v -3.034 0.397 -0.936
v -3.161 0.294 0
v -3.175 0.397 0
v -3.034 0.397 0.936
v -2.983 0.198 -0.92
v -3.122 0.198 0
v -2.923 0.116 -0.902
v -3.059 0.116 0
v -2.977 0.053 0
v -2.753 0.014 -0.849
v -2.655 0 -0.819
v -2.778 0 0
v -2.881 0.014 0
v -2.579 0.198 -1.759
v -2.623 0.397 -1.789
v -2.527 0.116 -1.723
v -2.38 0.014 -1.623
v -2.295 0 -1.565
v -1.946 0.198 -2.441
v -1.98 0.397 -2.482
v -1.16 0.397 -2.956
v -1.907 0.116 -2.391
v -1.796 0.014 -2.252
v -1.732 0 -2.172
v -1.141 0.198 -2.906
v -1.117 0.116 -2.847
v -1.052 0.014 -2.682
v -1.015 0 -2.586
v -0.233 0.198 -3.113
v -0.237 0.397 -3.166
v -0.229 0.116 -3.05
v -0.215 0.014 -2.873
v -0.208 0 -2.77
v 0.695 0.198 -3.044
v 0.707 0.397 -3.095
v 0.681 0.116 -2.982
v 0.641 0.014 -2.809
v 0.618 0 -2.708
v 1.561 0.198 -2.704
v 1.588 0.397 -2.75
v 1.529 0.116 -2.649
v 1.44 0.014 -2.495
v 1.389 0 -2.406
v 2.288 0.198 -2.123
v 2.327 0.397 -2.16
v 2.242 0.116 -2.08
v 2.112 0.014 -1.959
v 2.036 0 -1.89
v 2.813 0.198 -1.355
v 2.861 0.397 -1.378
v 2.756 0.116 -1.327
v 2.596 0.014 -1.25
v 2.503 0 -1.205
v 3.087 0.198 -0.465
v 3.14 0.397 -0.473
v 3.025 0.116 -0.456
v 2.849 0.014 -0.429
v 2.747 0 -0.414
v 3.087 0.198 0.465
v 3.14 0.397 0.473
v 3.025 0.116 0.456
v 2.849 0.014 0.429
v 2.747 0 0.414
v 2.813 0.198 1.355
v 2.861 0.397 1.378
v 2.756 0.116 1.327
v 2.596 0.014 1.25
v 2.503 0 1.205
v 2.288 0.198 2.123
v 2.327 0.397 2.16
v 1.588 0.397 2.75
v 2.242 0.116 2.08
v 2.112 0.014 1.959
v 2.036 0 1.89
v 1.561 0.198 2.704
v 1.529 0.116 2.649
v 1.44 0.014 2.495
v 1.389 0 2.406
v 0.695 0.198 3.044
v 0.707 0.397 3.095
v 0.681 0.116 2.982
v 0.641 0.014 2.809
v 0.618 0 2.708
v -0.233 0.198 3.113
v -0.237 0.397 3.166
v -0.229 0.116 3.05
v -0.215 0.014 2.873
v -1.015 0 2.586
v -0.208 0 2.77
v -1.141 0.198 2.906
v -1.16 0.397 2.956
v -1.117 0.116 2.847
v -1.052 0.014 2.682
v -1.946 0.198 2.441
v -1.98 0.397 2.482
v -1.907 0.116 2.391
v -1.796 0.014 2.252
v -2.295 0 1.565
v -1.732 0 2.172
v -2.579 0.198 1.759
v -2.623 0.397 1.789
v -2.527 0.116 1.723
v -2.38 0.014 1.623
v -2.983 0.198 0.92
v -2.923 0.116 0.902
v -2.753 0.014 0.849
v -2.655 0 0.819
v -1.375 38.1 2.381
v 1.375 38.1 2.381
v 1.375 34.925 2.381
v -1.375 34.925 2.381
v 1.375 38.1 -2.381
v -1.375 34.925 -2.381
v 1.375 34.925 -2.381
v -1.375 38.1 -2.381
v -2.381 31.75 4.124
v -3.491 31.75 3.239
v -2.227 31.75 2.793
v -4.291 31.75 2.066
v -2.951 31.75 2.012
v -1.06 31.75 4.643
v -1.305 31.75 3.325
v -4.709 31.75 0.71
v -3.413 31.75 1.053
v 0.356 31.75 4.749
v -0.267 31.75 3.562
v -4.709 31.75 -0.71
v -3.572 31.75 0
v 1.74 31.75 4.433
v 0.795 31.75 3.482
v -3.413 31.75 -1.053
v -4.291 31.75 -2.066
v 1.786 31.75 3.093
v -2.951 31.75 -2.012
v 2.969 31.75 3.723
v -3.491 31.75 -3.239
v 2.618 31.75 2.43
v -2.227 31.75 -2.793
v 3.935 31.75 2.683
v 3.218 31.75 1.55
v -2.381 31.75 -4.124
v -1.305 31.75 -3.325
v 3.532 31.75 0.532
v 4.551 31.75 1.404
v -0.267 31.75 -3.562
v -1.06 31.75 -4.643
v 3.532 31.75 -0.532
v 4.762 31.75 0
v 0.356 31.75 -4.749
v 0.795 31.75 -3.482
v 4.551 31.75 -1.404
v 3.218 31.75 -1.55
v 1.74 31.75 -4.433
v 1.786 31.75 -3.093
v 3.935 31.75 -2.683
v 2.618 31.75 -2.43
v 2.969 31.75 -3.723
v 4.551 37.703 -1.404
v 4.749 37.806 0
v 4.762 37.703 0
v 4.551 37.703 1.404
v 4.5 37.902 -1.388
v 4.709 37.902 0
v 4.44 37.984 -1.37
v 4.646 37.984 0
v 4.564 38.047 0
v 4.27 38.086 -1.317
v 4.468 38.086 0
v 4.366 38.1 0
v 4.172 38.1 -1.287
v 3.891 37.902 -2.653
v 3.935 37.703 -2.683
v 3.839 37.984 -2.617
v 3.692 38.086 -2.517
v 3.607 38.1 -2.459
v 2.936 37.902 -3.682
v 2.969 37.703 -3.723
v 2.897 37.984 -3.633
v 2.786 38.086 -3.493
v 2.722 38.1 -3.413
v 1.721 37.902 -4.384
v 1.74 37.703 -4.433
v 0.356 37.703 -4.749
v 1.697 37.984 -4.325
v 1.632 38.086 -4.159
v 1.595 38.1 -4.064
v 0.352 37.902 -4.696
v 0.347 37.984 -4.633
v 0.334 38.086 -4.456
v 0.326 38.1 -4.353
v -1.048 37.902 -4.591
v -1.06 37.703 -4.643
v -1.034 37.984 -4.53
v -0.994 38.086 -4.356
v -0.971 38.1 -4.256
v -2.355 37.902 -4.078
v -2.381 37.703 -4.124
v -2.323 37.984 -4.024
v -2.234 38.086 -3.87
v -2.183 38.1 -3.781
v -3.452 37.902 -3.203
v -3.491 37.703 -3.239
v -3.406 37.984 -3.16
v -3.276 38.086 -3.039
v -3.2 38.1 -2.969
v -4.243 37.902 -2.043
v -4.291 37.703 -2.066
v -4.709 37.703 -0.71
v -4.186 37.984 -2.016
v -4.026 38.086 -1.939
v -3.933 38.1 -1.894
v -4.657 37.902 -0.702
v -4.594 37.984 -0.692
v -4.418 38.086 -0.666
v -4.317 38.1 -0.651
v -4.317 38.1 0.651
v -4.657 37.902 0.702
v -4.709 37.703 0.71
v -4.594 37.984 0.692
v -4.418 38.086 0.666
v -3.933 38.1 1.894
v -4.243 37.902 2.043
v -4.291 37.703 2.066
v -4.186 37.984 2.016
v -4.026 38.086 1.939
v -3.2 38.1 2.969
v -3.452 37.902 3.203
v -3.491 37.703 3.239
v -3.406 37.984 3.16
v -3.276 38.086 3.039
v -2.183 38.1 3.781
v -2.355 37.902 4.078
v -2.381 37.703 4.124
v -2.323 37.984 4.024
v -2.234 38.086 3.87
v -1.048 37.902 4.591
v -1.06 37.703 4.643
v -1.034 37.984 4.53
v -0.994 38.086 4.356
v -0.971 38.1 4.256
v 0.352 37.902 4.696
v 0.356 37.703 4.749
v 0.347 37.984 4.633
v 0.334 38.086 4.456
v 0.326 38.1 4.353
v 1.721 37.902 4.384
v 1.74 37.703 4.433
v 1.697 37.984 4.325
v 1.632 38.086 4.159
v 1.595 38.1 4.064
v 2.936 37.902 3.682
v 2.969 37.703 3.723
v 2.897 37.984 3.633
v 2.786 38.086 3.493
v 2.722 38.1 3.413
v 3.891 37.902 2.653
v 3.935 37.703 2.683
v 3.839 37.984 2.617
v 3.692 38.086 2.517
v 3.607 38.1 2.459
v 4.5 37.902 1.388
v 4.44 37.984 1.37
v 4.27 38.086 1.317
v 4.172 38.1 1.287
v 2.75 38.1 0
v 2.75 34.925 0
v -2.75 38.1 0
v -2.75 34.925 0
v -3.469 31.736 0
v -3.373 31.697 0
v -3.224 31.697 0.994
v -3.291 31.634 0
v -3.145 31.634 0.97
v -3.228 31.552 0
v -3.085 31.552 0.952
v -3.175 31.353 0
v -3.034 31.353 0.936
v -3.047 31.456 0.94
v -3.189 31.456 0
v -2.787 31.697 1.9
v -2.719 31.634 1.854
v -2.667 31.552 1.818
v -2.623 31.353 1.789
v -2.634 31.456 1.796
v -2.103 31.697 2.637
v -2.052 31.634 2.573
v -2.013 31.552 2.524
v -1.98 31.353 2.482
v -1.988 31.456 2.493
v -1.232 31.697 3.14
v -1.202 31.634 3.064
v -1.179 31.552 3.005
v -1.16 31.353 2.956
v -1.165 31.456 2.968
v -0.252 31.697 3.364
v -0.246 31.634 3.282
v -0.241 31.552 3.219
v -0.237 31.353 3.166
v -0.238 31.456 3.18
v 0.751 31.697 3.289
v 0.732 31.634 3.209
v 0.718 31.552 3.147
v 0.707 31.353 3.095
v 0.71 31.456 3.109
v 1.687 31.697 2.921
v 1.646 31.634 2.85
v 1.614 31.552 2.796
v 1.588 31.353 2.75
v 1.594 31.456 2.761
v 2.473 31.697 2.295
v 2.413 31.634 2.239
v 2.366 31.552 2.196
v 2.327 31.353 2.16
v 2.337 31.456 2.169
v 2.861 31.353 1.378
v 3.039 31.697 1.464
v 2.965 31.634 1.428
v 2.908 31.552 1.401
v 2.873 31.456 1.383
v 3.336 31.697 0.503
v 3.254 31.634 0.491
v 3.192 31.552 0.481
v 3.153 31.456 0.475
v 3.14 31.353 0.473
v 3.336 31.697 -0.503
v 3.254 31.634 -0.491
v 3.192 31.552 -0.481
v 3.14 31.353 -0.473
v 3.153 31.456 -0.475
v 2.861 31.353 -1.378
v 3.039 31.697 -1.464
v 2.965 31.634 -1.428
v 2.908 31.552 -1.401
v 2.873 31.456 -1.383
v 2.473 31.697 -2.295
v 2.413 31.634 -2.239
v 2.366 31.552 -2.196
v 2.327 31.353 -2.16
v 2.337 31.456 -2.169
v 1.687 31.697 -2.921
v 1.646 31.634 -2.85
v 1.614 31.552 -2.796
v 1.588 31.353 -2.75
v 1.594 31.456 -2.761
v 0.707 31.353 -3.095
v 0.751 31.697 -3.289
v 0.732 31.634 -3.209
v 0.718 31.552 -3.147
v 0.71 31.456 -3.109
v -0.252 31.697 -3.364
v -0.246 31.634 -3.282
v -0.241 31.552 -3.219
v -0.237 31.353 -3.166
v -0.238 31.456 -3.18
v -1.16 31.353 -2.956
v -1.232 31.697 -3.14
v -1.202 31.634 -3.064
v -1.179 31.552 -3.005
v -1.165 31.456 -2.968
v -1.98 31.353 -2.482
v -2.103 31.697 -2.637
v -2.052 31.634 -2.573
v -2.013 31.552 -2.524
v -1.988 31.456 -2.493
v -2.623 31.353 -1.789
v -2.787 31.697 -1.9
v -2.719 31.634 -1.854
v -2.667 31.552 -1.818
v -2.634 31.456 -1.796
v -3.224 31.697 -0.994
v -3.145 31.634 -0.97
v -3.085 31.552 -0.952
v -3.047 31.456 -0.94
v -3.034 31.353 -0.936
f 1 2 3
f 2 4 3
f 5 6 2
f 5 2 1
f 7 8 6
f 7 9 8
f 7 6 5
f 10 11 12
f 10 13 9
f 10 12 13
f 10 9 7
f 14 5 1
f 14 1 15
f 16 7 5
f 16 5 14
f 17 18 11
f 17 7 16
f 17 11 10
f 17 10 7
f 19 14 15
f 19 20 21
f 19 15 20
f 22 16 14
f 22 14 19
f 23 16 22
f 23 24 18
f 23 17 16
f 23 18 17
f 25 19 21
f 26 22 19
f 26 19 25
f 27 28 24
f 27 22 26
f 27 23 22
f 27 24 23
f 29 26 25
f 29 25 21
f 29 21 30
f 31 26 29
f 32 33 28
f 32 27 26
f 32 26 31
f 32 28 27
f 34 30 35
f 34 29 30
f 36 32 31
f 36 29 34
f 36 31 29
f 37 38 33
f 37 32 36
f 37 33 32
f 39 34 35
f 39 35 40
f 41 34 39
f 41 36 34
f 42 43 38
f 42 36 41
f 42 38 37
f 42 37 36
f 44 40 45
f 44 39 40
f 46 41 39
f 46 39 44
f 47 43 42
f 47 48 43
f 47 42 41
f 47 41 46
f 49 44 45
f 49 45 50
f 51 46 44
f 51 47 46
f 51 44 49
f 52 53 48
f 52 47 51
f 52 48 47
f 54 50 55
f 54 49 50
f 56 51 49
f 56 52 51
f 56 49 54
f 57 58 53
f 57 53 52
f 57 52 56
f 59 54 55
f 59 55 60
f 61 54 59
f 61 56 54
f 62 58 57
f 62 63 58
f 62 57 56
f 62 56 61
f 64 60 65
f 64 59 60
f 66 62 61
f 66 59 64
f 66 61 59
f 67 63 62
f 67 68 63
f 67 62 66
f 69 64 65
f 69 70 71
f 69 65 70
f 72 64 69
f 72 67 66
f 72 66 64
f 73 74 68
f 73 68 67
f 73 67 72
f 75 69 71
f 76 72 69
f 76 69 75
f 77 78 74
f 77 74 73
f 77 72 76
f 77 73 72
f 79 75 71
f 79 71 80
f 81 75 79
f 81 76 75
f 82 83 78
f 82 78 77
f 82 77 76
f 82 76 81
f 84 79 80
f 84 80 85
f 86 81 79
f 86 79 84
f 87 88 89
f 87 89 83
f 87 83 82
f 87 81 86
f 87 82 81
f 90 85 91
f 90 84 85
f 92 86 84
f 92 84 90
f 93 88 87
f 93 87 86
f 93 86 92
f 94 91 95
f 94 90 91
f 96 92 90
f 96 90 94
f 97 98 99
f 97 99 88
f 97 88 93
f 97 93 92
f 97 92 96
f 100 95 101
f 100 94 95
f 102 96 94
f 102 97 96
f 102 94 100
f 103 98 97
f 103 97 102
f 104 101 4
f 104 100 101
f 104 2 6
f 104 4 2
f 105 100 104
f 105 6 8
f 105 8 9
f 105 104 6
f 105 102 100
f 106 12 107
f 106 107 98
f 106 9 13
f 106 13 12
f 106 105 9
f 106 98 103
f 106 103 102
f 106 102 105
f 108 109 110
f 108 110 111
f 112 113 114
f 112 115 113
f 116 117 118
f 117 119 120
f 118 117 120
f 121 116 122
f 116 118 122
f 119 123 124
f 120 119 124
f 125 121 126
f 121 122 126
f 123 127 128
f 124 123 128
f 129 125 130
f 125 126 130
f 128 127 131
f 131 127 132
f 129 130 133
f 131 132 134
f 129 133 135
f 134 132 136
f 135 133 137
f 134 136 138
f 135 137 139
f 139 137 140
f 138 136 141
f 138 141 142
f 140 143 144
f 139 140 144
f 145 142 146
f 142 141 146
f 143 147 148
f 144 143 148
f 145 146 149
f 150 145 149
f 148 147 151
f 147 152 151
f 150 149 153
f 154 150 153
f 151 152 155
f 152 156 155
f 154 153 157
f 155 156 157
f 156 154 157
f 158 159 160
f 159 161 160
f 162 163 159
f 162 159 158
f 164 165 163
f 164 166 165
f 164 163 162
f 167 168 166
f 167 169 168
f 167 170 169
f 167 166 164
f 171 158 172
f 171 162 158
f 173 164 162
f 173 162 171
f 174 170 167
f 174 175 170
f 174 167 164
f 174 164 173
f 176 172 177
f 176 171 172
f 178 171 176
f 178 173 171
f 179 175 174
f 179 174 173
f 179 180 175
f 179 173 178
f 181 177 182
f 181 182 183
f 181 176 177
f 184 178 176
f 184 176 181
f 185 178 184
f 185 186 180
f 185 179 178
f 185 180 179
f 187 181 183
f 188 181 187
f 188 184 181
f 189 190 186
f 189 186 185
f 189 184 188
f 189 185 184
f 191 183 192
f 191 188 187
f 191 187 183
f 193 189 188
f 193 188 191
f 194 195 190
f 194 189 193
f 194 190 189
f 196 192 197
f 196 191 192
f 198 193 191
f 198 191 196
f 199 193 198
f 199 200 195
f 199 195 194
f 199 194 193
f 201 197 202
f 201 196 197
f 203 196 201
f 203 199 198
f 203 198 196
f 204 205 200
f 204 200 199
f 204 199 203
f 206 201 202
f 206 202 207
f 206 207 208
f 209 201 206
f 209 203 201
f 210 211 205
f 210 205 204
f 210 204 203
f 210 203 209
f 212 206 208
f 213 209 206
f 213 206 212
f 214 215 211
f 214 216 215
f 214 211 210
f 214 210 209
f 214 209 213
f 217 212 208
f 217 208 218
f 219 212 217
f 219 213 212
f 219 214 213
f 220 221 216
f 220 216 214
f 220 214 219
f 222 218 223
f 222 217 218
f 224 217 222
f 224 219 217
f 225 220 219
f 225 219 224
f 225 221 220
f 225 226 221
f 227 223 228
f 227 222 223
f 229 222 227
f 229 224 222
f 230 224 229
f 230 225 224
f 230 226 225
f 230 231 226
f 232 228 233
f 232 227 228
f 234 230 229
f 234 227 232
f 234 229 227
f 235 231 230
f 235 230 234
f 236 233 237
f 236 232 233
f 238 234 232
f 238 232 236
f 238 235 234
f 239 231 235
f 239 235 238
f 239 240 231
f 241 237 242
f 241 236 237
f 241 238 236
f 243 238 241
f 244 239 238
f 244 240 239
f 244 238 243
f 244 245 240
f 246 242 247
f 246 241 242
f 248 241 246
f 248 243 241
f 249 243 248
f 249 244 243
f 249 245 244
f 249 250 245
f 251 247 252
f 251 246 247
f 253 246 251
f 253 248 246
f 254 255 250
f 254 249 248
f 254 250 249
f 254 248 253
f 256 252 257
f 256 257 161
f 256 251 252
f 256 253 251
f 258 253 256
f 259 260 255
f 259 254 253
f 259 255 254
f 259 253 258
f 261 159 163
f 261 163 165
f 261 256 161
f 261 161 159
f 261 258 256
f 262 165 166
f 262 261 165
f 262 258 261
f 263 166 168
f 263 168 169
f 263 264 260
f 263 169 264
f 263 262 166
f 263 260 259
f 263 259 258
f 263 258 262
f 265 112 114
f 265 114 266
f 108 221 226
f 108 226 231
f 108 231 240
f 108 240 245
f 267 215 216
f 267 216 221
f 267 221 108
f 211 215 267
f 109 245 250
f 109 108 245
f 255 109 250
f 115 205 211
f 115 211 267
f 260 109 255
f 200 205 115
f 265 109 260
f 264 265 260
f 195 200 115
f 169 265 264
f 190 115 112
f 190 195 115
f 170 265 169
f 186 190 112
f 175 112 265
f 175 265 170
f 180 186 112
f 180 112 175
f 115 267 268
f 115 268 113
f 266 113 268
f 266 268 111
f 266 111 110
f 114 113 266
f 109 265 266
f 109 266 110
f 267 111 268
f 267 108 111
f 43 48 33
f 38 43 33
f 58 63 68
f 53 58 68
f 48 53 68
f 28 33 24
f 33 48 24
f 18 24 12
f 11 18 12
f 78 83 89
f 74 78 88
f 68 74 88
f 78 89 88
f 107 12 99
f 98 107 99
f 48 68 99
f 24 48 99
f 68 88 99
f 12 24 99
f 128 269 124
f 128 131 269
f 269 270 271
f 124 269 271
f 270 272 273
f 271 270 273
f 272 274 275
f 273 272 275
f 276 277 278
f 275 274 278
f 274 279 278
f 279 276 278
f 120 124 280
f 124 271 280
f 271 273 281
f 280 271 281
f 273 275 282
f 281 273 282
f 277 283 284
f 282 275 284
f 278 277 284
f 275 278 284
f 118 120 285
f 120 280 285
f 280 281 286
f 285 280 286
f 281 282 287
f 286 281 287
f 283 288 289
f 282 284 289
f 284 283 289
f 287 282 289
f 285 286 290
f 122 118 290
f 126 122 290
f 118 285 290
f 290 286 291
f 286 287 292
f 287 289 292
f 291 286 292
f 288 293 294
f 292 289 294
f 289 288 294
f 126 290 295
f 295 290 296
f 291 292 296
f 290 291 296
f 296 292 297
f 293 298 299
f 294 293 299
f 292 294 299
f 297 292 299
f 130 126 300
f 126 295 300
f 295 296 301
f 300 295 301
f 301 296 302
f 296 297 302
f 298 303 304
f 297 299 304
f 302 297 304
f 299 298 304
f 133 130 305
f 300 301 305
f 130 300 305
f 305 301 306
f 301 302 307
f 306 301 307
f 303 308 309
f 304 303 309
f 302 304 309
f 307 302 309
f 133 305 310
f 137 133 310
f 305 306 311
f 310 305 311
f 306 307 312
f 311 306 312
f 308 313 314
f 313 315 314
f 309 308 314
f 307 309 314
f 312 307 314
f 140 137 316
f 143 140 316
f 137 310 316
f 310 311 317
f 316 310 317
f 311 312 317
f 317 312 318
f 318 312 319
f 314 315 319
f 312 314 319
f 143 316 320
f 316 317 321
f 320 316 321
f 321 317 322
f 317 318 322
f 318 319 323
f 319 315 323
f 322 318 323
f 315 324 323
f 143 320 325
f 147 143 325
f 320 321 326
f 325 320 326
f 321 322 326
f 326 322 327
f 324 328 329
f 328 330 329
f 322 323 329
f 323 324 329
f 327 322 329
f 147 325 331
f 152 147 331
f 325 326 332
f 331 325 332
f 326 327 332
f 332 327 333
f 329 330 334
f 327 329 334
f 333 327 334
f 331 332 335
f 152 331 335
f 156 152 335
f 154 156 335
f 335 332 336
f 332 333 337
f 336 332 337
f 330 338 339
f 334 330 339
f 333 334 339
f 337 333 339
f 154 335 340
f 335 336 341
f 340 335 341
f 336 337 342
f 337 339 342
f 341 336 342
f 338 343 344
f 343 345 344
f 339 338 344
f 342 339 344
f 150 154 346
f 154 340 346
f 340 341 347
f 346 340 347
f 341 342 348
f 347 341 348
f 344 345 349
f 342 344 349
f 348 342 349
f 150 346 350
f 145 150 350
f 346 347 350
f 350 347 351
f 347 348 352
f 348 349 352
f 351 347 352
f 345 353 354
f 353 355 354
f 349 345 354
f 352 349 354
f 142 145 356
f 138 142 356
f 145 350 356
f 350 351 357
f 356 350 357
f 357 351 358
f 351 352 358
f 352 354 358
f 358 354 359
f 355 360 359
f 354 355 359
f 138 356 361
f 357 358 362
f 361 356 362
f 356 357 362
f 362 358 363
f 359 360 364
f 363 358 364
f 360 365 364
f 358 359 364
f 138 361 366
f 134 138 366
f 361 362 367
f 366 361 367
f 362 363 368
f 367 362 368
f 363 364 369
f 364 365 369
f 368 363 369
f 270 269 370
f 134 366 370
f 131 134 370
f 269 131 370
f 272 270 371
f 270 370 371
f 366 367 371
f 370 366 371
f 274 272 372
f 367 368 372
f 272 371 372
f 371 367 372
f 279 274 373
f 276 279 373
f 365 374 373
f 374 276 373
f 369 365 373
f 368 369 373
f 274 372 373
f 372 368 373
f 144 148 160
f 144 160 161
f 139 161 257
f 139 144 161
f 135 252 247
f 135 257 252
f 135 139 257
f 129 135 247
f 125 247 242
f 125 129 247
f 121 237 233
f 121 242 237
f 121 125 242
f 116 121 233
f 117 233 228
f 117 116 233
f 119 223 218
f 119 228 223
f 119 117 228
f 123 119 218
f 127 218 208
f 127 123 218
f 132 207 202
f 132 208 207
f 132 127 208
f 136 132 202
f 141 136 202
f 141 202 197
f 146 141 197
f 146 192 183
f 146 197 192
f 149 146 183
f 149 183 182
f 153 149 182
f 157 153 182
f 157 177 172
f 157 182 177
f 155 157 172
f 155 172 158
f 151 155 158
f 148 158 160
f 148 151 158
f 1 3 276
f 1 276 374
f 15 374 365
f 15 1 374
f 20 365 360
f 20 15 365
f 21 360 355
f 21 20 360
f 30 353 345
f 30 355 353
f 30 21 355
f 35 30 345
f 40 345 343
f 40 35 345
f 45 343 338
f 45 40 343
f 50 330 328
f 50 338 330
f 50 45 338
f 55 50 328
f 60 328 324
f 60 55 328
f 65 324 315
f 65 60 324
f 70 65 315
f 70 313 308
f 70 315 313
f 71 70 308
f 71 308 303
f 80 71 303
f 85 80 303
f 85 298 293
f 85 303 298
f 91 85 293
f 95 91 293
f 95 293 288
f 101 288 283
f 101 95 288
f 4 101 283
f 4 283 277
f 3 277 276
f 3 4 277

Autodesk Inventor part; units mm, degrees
ref_plane "YZ Plane" through (0, 0, 0) normal (1, 0, 0) x (0, 1, 0)
ref_plane "XZ Plane" through (0, 0, 0) normal (0, 1, 0) x (-1, 0, 0)
ref_plane "XY Plane" through (0, 0, 0) normal (0, 0, 1) x (1, 0, 0)
sketch "Sketch1" plane through (0, 0, 0) normal (0, 1, 0) x (-1, 0, 0)
  circle A0 centre (0, 0) radius 3.175
  dimension "d0" = 6.35
extrude "Extrusion1" add sketch "Sketch1" along normal blind 31.75
sketch "Sketch2" plane through (0, 31.75, 0) normal (0, 1, 0) x (1, 0, 0)
  circle A0 centre (0, 0) radius 3.175 projected
  circle A1 centre (0, 0) radius 4.7625
  dimension "d3" = 9.525
extrude "Extrusion2" add sketch "Sketch2" along normal blind 6.35 contours A0 | A1
sketch "Sketch3" plane through (0, 38.1, 0) normal (0, 1, 0) x (1, 0, 0)
  circle A0 centre (0, 0) radius 4.7625 projected
  line L0 (-1.3748, 2.3812) -> (1.3748, 2.3813)
  line L1 (1.3748, 2.3813) -> (2.7496, 0)
  line L2 (2.7496, 0) -> (1.3748, -2.3813)
  line L3 (1.3748, -2.3813) -> (-1.3748, -2.3813)
  line L4 (-1.3748, -2.3813) -> (-2.7496, 0)
  line L5 (-2.7496, 0) -> (-1.3748, 2.3812)
  dimension "d6" = 4.7625
extrude "Extrusion3" cut sketch "Sketch3" against normal blind 3.175 contours L0 L1 L2 L3 L4 L5
fillet "Fillet1" radius 0.3969 3 edges at (3.175, 31.75, 0) (-4.7625, 38.1, 0) (3.175, 0, 0)
properties part number "Bolt_0.25_20_1.25len_SocketHead" material "Stainless Steel, Austenitic"
